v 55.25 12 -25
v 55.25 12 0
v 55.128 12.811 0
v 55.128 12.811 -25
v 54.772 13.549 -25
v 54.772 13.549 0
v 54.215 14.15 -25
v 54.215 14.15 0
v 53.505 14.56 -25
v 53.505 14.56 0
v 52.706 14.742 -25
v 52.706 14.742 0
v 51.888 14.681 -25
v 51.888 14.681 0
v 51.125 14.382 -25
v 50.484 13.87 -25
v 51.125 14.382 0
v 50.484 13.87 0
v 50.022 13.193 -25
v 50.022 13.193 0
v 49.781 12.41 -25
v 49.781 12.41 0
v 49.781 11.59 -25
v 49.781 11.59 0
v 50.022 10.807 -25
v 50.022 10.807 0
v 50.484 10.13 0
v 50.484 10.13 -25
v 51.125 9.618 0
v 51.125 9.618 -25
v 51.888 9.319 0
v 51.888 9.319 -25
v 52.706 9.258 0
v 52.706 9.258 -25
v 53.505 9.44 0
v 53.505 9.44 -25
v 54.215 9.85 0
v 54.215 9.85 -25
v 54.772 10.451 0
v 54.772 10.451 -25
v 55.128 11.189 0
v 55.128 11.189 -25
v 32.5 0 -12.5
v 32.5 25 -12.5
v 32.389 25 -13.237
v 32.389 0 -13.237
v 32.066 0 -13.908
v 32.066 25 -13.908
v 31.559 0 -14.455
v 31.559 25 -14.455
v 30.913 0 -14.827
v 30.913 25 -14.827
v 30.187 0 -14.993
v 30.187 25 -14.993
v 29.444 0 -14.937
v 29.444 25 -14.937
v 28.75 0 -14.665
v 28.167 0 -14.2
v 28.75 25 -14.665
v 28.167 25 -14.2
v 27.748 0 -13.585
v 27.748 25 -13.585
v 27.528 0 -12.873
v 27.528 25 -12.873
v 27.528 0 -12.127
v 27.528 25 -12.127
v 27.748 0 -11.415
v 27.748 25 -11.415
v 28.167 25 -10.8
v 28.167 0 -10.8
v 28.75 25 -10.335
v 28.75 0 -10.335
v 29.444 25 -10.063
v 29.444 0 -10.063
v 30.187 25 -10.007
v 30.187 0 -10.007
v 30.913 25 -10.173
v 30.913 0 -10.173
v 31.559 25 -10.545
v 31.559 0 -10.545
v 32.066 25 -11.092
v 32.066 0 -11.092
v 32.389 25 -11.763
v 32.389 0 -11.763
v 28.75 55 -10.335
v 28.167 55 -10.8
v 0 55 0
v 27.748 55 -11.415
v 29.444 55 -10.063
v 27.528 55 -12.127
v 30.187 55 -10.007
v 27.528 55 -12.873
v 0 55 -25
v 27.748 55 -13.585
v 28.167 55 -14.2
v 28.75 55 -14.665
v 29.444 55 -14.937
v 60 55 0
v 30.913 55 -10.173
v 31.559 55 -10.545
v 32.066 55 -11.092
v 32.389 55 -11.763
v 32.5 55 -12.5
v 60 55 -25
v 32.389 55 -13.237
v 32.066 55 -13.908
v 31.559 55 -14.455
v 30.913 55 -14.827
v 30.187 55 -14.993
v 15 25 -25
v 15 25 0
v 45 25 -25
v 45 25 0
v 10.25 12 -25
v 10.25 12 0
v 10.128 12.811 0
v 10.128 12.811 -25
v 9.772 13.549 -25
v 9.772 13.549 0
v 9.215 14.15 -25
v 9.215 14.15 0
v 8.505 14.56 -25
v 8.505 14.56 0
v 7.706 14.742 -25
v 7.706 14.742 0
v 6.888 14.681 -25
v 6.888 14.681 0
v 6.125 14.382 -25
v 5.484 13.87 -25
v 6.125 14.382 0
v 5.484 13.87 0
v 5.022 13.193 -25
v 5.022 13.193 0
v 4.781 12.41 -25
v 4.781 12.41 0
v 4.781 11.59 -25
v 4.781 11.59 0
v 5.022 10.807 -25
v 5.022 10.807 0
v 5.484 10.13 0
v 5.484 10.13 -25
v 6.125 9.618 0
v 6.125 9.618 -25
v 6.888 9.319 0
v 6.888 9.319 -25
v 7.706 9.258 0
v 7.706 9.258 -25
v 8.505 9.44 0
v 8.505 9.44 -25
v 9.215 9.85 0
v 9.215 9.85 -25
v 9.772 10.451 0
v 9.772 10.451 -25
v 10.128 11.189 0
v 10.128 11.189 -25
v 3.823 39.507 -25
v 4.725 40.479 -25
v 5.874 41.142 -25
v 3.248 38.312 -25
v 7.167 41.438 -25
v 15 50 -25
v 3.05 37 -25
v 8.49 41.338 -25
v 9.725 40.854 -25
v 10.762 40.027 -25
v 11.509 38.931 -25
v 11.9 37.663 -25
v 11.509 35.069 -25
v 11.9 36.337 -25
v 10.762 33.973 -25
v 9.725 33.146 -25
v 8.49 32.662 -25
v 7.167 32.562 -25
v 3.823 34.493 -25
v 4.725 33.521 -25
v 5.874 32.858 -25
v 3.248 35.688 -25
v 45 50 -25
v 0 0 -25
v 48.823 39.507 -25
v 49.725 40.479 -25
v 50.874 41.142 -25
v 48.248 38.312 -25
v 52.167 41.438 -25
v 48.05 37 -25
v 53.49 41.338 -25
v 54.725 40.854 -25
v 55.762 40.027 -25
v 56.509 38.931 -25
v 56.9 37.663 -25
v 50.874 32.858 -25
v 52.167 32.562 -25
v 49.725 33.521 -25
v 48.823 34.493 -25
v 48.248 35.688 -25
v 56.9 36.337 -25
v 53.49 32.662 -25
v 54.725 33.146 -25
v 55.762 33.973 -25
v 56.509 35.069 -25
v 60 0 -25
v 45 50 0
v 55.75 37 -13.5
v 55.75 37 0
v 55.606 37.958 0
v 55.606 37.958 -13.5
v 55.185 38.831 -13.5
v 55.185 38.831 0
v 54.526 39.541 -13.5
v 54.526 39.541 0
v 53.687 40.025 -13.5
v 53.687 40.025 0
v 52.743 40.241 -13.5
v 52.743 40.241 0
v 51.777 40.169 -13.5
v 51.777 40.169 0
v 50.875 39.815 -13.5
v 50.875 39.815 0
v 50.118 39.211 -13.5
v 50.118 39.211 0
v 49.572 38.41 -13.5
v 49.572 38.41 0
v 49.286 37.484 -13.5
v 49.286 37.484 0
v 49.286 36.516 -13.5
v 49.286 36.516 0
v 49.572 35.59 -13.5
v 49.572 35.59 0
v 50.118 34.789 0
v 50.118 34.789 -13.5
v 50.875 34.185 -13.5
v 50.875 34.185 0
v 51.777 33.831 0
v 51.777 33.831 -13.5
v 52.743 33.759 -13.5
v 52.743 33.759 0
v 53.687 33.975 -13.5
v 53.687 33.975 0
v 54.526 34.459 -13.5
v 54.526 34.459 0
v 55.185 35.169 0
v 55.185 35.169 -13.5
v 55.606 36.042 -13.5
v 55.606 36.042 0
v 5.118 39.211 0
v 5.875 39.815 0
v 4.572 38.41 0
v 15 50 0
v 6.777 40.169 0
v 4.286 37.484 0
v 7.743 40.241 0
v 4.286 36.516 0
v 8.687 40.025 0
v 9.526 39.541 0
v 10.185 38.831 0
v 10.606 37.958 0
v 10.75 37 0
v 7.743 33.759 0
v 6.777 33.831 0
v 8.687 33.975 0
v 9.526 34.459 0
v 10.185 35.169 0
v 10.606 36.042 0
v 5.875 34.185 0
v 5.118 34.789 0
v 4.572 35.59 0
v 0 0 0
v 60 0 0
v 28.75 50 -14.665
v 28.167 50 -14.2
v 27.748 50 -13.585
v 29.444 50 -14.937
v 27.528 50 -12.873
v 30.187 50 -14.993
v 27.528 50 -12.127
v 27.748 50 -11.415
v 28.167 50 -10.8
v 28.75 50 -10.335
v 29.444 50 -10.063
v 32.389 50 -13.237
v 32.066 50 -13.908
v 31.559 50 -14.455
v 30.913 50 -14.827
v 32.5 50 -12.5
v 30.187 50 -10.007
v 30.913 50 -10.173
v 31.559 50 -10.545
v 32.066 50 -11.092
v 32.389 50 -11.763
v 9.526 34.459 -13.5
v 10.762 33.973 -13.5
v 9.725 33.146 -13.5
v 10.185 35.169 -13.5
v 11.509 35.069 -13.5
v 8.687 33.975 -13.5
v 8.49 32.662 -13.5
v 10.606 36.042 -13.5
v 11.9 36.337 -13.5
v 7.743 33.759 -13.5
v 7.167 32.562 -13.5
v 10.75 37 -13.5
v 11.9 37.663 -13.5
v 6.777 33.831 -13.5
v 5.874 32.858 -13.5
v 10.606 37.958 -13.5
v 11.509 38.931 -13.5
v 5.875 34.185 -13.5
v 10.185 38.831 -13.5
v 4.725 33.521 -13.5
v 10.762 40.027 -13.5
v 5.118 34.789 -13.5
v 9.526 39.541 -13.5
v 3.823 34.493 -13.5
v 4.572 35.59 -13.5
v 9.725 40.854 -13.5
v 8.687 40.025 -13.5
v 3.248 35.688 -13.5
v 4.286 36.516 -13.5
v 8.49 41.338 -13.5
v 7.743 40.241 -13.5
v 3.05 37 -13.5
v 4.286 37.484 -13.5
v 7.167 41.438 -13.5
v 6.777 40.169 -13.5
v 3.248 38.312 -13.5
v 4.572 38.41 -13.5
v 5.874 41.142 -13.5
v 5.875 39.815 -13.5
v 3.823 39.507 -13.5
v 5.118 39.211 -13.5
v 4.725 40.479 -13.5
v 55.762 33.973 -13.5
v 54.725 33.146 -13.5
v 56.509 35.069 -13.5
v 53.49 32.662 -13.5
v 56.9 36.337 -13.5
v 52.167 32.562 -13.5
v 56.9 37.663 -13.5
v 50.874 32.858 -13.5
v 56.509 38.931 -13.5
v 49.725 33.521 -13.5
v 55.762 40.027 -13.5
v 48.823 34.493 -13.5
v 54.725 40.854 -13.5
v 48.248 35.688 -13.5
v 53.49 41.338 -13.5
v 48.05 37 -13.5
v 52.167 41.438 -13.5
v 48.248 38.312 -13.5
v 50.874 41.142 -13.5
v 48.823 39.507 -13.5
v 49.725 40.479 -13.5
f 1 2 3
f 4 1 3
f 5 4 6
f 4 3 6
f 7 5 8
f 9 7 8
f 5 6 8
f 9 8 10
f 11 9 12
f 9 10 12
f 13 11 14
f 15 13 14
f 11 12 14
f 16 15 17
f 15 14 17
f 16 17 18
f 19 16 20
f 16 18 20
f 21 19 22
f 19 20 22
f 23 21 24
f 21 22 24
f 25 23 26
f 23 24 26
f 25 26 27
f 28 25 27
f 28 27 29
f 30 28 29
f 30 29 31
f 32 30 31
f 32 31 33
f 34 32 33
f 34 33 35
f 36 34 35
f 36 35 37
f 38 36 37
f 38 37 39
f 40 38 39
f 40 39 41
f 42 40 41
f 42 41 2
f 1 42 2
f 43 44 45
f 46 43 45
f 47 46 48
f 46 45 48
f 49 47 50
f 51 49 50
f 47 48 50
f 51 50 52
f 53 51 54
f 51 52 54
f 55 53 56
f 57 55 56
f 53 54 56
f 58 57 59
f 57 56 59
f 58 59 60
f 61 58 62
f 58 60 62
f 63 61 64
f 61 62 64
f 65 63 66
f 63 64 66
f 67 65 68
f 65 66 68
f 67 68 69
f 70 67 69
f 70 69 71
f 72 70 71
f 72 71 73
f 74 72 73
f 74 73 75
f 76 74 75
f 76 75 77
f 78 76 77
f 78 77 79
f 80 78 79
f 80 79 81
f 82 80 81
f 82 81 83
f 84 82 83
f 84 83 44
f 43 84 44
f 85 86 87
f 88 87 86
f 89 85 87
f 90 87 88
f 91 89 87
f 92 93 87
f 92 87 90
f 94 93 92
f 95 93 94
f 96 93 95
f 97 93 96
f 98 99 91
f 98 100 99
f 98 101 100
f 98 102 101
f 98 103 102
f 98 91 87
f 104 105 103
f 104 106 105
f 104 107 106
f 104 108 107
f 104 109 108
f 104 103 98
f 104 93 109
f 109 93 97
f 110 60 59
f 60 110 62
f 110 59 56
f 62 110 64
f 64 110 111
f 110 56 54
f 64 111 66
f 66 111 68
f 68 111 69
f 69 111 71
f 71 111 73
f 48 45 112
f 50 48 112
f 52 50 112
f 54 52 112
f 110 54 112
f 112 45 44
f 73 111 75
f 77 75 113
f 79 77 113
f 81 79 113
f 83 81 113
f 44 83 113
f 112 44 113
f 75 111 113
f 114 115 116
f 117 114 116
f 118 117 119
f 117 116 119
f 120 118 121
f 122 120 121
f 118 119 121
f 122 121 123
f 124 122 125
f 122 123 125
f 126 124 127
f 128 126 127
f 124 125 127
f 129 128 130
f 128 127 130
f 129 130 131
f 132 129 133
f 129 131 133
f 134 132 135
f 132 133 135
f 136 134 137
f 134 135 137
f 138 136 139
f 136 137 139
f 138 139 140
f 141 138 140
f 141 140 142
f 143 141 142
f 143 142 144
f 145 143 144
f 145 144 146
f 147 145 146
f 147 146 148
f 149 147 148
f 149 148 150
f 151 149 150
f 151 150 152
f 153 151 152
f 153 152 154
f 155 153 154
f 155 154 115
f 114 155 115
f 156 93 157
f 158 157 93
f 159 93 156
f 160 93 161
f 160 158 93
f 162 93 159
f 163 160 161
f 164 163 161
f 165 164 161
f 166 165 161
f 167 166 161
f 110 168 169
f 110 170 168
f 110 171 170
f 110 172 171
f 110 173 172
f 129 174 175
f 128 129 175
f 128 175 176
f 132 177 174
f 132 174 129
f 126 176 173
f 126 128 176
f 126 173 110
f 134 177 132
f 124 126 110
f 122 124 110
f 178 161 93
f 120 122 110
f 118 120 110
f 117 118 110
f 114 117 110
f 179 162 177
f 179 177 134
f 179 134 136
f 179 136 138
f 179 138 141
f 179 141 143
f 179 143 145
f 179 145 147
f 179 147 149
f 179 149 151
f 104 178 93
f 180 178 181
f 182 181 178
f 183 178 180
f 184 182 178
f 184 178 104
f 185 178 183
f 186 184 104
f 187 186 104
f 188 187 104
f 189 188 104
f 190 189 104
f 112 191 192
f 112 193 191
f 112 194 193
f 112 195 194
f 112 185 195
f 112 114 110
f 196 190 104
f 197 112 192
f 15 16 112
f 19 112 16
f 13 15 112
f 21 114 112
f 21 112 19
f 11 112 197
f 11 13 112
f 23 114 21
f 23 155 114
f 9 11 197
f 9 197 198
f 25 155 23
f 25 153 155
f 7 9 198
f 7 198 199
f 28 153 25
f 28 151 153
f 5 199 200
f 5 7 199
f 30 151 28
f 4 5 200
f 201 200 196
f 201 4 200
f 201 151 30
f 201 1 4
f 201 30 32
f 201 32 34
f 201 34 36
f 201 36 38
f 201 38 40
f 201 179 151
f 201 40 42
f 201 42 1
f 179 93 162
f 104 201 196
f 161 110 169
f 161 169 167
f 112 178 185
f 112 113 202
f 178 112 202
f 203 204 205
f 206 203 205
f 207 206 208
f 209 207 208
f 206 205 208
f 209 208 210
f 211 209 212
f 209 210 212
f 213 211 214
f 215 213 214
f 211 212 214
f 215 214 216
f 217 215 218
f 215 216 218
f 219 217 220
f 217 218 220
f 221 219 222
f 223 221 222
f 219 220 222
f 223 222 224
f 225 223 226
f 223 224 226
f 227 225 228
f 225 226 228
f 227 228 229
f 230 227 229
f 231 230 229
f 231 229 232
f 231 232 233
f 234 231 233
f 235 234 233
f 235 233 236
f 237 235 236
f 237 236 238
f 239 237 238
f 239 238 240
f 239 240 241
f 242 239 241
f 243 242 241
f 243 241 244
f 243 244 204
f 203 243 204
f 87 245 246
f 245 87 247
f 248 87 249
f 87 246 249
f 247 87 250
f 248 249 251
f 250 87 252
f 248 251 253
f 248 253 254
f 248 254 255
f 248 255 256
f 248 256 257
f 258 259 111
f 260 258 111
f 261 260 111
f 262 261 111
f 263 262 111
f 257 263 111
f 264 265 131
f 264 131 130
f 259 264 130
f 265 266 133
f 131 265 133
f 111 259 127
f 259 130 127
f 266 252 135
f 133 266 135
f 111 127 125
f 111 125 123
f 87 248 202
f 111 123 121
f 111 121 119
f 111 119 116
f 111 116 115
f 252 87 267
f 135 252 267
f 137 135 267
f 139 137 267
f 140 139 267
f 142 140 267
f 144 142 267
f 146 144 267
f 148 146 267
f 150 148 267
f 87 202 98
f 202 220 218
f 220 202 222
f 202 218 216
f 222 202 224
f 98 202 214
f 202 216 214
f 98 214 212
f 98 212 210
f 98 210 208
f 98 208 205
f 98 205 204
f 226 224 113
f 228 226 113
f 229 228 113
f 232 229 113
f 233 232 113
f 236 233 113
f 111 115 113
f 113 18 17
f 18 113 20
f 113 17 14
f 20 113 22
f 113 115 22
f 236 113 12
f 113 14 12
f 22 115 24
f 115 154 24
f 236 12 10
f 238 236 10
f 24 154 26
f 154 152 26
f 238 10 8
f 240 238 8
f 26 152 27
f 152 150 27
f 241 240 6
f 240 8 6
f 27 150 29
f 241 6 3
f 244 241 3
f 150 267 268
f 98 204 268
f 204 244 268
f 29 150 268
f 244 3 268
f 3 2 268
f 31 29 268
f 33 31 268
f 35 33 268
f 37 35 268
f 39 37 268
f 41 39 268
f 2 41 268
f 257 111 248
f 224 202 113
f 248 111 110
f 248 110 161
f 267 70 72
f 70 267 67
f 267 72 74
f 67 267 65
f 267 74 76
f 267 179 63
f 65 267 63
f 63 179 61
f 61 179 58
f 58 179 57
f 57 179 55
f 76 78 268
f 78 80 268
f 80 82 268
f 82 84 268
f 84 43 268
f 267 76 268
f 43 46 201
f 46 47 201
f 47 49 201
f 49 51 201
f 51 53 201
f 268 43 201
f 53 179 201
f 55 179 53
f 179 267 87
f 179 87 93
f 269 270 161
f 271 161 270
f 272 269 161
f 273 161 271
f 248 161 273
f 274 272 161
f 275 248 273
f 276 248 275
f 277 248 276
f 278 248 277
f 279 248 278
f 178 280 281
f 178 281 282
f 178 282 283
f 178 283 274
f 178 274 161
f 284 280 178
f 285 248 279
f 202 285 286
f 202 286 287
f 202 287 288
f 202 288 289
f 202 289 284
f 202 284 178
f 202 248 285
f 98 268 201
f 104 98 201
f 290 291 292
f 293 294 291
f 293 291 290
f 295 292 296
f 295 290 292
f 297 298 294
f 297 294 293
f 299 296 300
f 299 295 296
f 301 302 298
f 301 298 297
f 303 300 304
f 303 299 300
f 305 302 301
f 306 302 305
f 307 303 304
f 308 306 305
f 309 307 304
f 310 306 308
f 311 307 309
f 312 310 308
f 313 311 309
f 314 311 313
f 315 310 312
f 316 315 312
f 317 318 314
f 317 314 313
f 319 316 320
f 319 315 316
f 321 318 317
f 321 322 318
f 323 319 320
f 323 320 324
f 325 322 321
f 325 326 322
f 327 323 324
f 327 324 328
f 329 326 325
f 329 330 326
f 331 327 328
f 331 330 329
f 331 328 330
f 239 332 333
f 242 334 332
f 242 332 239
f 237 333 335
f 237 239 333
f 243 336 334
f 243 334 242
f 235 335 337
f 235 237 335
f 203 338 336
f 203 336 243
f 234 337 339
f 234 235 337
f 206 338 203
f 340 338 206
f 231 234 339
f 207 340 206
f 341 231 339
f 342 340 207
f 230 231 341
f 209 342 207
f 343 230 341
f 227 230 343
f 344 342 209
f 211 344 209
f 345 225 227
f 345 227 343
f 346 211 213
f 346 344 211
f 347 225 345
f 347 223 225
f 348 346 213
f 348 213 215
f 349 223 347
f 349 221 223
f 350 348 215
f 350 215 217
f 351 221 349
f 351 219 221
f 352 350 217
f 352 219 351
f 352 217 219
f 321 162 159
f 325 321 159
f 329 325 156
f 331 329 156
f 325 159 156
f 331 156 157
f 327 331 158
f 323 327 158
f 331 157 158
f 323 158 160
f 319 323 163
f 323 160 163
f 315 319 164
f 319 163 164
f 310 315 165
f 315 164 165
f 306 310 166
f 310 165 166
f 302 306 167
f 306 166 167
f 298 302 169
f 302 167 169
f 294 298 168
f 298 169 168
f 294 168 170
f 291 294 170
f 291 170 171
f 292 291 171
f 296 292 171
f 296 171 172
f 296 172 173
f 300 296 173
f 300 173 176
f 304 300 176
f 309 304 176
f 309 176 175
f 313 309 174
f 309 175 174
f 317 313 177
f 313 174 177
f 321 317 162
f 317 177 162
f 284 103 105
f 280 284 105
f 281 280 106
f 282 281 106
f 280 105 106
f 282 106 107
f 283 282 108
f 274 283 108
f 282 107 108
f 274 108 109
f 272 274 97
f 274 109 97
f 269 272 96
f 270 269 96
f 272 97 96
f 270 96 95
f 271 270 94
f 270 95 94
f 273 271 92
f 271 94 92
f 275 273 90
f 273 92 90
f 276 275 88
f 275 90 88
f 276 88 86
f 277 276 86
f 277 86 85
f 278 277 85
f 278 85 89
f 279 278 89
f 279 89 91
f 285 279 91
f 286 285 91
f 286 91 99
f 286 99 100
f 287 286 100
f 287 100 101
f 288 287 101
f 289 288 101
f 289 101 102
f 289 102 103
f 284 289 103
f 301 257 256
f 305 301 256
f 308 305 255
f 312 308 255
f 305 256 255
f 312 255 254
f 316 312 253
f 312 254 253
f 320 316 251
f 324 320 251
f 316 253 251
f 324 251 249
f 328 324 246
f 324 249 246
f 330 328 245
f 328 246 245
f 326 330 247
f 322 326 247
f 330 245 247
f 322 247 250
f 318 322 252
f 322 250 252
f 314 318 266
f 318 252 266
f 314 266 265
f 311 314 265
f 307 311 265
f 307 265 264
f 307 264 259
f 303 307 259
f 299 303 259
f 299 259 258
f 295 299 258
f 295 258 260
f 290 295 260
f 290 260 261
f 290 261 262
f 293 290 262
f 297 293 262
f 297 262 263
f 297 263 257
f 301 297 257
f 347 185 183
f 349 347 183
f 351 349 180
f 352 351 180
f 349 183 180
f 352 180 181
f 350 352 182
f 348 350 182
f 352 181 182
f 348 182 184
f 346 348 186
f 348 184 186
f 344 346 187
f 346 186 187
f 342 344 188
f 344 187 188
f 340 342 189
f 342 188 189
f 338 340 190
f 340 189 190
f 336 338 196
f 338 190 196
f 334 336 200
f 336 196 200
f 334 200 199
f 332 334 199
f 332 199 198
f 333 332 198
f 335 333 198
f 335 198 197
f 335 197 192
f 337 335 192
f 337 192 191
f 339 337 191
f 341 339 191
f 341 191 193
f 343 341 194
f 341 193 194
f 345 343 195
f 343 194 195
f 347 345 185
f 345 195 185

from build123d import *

# Parameters (mm, degrees)
SKETCH2_W           = 60
SKETCH2_H           = 25
BOSS_EXTRUDE1_DEPTH = 55
CUT_EXTRUDE1_REACH  = 27
SKETCH3_W           = 30
SKETCH3_H           = 25
SKETCH4_R           = 2.5
CUT_EXTRUDE2_DEPTH  = 56
SKETCH5_R           = 3.25
SKETCH5_R_2         = 2.75
CUT_EXTRUDE3_DEPTH  = 26
SKETCH9_R           = 4.45
CUT_EXTRUDE7_DEPTH  = 11.5


with BuildPart() as part:
    # Sketch2 → Boss-Extrude1 (new body)
    with BuildSketch(Plane(origin=(0, 0, 0), x_dir=(1, 0, 0), z_dir=(0, 1, 0))):
        with Locations((30, 12.5)):
            Rectangle(SKETCH2_W, SKETCH2_H)
    extrude(amount=BOSS_EXTRUDE1_DEPTH)

    # Sketch3 → Cut-Extrude1 (cut, up to next)
    with BuildSketch(Plane.XY, mode=Mode.PRIVATE) as cut_extrude1_sk1:
        with Locations((30, 37.5)):
            Rectangle(SKETCH3_W, SKETCH3_H)
    cut_extrude1_tool1 = extrude(cut_extrude1_sk1.sketch, amount=-CUT_EXTRUDE1_REACH, mode=Mode.PRIVATE) & part.part
    add(cut_extrude1_tool1.solids().sort_by_distance((30, 37.5, 0))[0], mode=Mode.SUBTRACT)

    # Sketch4 → Cut-Extrude2 (cut, through all)
    with BuildSketch(Plane(origin=(0, 55, 0), x_dir=(1, 0, 0), z_dir=(0, 1, 0))):
        with Locations((30, 12.5)):
            Circle(SKETCH4_R)
    extrude(amount=-CUT_EXTRUDE2_DEPTH, mode=Mode.SUBTRACT)

    # Sketch5 → Cut-Extrude3 (cut, through all)
    with BuildSketch(Plane.XY):
        with Locations((7.5, 37)):
            Circle(SKETCH5_R)
        with Locations((7.5, 12)):
            Circle(SKETCH5_R_2)
        with Locations((52.5, 12)):
            Circle(SKETCH5_R_2)
        with Locations((52.5, 37)):
            Circle(SKETCH5_R)
    extrude(amount=-CUT_EXTRUDE3_DEPTH, mode=Mode.SUBTRACT)

    # Sketch9 → Cut-Extrude7 (cut)
    with BuildSketch(Plane(origin=(0, 0, -25), x_dir=(-1, 0, 0), z_dir=(0, 0, -1))):
        with Locations((-52.5, 37)):
            Circle(SKETCH9_R)
        with Locations((-7.5, 37)):
            Circle(SKETCH9_R)
    extrude(amount=-CUT_EXTRUDE7_DEPTH, mode=Mode.SUBTRACT)


solid = part.part
